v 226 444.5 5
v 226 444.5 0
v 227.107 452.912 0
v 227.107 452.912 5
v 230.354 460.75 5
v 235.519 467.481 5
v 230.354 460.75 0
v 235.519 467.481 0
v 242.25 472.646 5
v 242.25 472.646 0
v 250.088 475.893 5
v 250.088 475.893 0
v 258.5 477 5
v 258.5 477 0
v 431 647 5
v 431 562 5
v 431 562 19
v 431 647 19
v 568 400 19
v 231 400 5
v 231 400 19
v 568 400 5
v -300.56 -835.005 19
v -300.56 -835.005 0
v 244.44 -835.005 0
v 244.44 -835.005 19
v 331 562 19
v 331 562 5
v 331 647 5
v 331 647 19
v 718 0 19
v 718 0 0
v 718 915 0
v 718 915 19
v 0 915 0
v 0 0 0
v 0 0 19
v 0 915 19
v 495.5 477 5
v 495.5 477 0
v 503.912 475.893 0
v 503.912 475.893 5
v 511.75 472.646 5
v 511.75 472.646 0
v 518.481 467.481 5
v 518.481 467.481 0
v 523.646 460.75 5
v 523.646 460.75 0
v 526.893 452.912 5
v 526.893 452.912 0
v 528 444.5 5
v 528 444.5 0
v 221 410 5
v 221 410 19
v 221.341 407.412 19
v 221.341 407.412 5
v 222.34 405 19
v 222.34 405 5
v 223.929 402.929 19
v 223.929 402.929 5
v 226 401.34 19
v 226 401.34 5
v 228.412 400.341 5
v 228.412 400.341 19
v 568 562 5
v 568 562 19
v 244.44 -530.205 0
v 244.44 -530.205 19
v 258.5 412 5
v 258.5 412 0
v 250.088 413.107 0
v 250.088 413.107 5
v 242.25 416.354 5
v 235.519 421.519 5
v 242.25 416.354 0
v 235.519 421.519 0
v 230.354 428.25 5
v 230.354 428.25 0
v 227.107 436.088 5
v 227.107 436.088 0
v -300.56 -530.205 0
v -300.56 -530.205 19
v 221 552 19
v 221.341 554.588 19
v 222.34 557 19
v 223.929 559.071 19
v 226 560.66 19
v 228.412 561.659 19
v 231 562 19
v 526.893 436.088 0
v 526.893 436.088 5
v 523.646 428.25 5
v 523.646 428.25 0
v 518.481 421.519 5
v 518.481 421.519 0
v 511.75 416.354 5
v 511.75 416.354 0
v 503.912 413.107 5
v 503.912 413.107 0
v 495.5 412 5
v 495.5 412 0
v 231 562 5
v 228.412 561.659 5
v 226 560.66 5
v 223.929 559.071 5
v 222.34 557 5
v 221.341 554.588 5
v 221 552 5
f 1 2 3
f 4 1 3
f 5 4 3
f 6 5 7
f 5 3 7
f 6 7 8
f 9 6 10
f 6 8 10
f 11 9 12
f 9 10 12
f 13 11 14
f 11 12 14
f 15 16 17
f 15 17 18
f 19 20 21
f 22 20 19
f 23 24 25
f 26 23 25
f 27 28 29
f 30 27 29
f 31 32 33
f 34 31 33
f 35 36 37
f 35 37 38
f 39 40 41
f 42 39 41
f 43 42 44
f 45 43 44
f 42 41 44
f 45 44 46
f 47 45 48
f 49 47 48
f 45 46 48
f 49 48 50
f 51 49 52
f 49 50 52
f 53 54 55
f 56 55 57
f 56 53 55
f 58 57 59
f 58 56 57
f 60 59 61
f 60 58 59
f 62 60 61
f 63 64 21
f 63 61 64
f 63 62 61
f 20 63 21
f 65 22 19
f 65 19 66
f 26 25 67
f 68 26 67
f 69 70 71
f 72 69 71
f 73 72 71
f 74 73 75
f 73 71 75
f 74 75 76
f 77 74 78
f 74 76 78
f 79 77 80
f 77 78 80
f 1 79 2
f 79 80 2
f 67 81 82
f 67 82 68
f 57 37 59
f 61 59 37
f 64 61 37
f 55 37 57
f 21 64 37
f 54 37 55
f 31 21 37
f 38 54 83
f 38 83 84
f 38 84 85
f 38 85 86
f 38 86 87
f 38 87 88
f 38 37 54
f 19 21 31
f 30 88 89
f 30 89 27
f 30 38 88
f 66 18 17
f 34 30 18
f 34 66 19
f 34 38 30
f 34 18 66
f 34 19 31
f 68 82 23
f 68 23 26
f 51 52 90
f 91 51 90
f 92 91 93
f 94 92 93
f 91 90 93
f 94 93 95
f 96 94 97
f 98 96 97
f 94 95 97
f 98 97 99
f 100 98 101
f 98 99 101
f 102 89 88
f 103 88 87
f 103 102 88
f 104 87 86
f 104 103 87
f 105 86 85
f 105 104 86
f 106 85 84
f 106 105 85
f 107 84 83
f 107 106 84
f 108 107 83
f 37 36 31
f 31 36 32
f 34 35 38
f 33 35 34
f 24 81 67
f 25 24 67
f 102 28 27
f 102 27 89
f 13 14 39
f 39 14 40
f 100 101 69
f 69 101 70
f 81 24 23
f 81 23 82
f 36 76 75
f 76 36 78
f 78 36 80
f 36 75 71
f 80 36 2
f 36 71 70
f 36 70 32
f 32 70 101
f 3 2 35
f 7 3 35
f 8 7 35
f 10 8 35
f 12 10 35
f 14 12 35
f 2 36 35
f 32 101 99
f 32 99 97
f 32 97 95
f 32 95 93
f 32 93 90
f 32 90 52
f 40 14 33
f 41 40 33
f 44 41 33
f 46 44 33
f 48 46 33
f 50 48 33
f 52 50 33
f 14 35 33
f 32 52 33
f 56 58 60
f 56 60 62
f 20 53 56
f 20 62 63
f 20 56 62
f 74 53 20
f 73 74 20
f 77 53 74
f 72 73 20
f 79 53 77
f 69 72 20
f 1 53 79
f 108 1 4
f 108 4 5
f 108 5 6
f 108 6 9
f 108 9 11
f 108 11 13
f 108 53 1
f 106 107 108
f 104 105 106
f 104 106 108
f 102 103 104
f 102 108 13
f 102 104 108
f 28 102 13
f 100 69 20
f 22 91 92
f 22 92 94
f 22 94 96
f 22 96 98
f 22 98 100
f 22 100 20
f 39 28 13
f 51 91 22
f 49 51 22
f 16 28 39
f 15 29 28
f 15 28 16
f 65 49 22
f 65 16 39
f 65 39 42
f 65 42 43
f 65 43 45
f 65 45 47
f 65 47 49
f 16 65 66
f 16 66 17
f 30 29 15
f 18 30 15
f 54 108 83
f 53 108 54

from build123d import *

# Parameters (mm, degrees)
F5_W     = 718
F5_H     = 915
F1_DEPTH = 19
F5_W_2   = 545
F5_H_2   = 304.8
F2_DEPTH = 30
F0_W     = 100
F0_H     = 85
F3_DEPTH = 5
F4_START = 5
F4_DEPTH = 40


with BuildPart() as f1:
    # F5 (on Top) → F1 (new body)
    with BuildSketch(Plane.XY):
        with Locations((359, 457.5)):
            Rectangle(F5_W, F5_H)
    extrude(amount=F1_DEPTH)

    # F0 (on face) → F2 (cut)
    with BuildSketch(Plane.XY):
        with BuildLine():
            ThreePointArc((223, 410), (225.3431457505, 404.3431457505), (231, 402))
            Line((231, 402), (568, 402))
            Line((568, 402), (568, 560))
            Line((568, 560), (231, 560))
            ThreePointArc((231, 560), (225.3431457505, 557.6568542495), (223, 552))
            Line((223, 552), (223, 410))
        make_face()
        with BuildLine():
            Line((495.5, 412), (258.5, 412))
            ThreePointArc((258.5, 412), (235.5190296114, 421.5190296114), (226, 444.5))
            ThreePointArc((226, 444.5), (235.5190296114, 467.4809703886), (258.5, 477))
            Line((258.5, 477), (495.5, 477))
            ThreePointArc((495.5, 477), (518.4809703886, 467.4809703886), (528, 444.5))
            ThreePointArc((528, 444.5), (518.4809703886, 421.5190296114), (495.5, 412))
        make_face(mode=Mode.SUBTRACT)
        with BuildLine():
            ThreePointArc((226, 444.5), (235.5190296114, 421.5190296114), (258.5, 412))
            Line((258.5, 412), (495.5, 412))
            ThreePointArc((495.5, 412), (518.4809703886, 421.5190296114), (528, 444.5))
            ThreePointArc((528, 444.5), (518.4809703886, 467.4809703886), (495.5, 477))
            Line((495.5, 477), (258.5, 477))
            ThreePointArc((258.5, 477), (235.5190296114, 467.4809703886), (226, 444.5))
        make_face()
        with BuildLine():
            ThreePointArc((228, 444.5), (236.9332431738, 466.0667568262), (258.5, 475))
            Line((258.5, 475), (495.5, 475))
            ThreePointArc((495.5, 475), (517.0667568262, 466.0667568262), (526, 444.5))
            ThreePointArc((526, 444.5), (517.0667568262, 422.9332431738), (495.5, 414))
            Line((495.5, 414), (258.5, 414))
            ThreePointArc((258.5, 414), (236.9332431738, 422.9332431738), (228, 444.5))
        make_face(mode=Mode.SUBTRACT)
        with BuildLine():
            Line((495.5, 475), (258.5, 475))
            ThreePointArc((258.5, 475), (236.9332431738, 466.0667568262), (228, 444.5))
            ThreePointArc((228, 444.5), (236.9332431738, 422.9332431738), (258.5, 414))
            Line((258.5, 414), (495.5, 414))
            ThreePointArc((495.5, 414), (517.0667568262, 422.9332431738), (526, 444.5))
            ThreePointArc((526, 444.5), (517.0667568262, 466.0667568262), (495.5, 475))
        make_face()
        with BuildLine():
            Line((568, 402), (231, 402))
            ThreePointArc((231, 402), (225.3431457505, 404.3431457505), (223, 410))
            Line((223, 410), (223, 552))
            ThreePointArc((223, 552), (225.3431457505, 557.6568542495), (231, 560))
            Line((231, 560), (568, 560))
            Line((568, 560), (568, 562))
            Line((568, 562), (431, 562))
            Line((431, 562), (331, 562))
            Line((331, 562), (231, 562))
            ThreePointArc((231, 562), (223.9289321881, 559.0710678119), (221, 552))
            Line((221, 552), (221, 410))
            ThreePointArc((221, 410), (223.9289321881, 402.9289321881), (231, 400))
            Line((231, 400), (568, 400))
            Line((568, 400), (568, 402))
        make_face()
    extrude(amount=F2_DEPTH, mode=Mode.SUBTRACT)

    # F0 (on face) → F3 (join)
    with BuildSketch(Plane.XY):
        with BuildLine():
            ThreePointArc((223, 410), (225.3431457505, 404.3431457505), (231, 402))
            Line((231, 402), (568, 402))
            Line((568, 402), (568, 560))
            Line((568, 560), (231, 560))
            ThreePointArc((231, 560), (225.3431457505, 557.6568542495), (223, 552))
            Line((223, 552), (223, 410))
        make_face()
        with BuildLine():
            Line((495.5, 412), (258.5, 412))
            ThreePointArc((258.5, 412), (235.5190296114, 421.5190296114), (226, 444.5))
            ThreePointArc((226, 444.5), (235.5190296114, 467.4809703886), (258.5, 477))
            Line((258.5, 477), (495.5, 477))
            ThreePointArc((495.5, 477), (518.4809703886, 467.4809703886), (528, 444.5))
            ThreePointArc((528, 444.5), (518.4809703886, 421.5190296114), (495.5, 412))
        make_face(mode=Mode.SUBTRACT)
        with BuildLine():
            Line((568, 402), (231, 402))
            ThreePointArc((231, 402), (225.3431457505, 404.3431457505), (223, 410))
            Line((223, 410), (223, 552))
            ThreePointArc((223, 552), (225.3431457505, 557.6568542495), (231, 560))
            Line((231, 560), (568, 560))
            Line((568, 560), (568, 562))
            Line((568, 562), (431, 562))
            Line((431, 562), (331, 562))
            Line((331, 562), (231, 562))
            ThreePointArc((231, 562), (223.9289321881, 559.0710678119), (221, 552))
            Line((221, 552), (221, 410))
            ThreePointArc((221, 410), (223.9289321881, 402.9289321881), (231, 400))
            Line((231, 400), (568, 400))
            Line((568, 400), (568, 402))
        make_face()
        with Locations((381, 604.5)):
            Rectangle(F0_W, F0_H)
    extrude(amount=F3_DEPTH)

    # F0 (on face) → F4 (cut)
    with BuildSketch(Plane.XY.offset(F4_START)):
        with Locations((381, 604.5)):
            Rectangle(F0_W, F0_H)
    extrude(amount=F4_DEPTH, mode=Mode.SUBTRACT)


with BuildPart() as f1b:
    # F5 (on Top) → F1, piece 2 (new body)
    with BuildSketch(Plane.XY):
        with Locations((-28.0601912737, -682.6046873093)):
            Rectangle(F5_W_2, F5_H_2)
    extrude(amount=F1_DEPTH)


solid = Compound([f1.part, f1b.part])
